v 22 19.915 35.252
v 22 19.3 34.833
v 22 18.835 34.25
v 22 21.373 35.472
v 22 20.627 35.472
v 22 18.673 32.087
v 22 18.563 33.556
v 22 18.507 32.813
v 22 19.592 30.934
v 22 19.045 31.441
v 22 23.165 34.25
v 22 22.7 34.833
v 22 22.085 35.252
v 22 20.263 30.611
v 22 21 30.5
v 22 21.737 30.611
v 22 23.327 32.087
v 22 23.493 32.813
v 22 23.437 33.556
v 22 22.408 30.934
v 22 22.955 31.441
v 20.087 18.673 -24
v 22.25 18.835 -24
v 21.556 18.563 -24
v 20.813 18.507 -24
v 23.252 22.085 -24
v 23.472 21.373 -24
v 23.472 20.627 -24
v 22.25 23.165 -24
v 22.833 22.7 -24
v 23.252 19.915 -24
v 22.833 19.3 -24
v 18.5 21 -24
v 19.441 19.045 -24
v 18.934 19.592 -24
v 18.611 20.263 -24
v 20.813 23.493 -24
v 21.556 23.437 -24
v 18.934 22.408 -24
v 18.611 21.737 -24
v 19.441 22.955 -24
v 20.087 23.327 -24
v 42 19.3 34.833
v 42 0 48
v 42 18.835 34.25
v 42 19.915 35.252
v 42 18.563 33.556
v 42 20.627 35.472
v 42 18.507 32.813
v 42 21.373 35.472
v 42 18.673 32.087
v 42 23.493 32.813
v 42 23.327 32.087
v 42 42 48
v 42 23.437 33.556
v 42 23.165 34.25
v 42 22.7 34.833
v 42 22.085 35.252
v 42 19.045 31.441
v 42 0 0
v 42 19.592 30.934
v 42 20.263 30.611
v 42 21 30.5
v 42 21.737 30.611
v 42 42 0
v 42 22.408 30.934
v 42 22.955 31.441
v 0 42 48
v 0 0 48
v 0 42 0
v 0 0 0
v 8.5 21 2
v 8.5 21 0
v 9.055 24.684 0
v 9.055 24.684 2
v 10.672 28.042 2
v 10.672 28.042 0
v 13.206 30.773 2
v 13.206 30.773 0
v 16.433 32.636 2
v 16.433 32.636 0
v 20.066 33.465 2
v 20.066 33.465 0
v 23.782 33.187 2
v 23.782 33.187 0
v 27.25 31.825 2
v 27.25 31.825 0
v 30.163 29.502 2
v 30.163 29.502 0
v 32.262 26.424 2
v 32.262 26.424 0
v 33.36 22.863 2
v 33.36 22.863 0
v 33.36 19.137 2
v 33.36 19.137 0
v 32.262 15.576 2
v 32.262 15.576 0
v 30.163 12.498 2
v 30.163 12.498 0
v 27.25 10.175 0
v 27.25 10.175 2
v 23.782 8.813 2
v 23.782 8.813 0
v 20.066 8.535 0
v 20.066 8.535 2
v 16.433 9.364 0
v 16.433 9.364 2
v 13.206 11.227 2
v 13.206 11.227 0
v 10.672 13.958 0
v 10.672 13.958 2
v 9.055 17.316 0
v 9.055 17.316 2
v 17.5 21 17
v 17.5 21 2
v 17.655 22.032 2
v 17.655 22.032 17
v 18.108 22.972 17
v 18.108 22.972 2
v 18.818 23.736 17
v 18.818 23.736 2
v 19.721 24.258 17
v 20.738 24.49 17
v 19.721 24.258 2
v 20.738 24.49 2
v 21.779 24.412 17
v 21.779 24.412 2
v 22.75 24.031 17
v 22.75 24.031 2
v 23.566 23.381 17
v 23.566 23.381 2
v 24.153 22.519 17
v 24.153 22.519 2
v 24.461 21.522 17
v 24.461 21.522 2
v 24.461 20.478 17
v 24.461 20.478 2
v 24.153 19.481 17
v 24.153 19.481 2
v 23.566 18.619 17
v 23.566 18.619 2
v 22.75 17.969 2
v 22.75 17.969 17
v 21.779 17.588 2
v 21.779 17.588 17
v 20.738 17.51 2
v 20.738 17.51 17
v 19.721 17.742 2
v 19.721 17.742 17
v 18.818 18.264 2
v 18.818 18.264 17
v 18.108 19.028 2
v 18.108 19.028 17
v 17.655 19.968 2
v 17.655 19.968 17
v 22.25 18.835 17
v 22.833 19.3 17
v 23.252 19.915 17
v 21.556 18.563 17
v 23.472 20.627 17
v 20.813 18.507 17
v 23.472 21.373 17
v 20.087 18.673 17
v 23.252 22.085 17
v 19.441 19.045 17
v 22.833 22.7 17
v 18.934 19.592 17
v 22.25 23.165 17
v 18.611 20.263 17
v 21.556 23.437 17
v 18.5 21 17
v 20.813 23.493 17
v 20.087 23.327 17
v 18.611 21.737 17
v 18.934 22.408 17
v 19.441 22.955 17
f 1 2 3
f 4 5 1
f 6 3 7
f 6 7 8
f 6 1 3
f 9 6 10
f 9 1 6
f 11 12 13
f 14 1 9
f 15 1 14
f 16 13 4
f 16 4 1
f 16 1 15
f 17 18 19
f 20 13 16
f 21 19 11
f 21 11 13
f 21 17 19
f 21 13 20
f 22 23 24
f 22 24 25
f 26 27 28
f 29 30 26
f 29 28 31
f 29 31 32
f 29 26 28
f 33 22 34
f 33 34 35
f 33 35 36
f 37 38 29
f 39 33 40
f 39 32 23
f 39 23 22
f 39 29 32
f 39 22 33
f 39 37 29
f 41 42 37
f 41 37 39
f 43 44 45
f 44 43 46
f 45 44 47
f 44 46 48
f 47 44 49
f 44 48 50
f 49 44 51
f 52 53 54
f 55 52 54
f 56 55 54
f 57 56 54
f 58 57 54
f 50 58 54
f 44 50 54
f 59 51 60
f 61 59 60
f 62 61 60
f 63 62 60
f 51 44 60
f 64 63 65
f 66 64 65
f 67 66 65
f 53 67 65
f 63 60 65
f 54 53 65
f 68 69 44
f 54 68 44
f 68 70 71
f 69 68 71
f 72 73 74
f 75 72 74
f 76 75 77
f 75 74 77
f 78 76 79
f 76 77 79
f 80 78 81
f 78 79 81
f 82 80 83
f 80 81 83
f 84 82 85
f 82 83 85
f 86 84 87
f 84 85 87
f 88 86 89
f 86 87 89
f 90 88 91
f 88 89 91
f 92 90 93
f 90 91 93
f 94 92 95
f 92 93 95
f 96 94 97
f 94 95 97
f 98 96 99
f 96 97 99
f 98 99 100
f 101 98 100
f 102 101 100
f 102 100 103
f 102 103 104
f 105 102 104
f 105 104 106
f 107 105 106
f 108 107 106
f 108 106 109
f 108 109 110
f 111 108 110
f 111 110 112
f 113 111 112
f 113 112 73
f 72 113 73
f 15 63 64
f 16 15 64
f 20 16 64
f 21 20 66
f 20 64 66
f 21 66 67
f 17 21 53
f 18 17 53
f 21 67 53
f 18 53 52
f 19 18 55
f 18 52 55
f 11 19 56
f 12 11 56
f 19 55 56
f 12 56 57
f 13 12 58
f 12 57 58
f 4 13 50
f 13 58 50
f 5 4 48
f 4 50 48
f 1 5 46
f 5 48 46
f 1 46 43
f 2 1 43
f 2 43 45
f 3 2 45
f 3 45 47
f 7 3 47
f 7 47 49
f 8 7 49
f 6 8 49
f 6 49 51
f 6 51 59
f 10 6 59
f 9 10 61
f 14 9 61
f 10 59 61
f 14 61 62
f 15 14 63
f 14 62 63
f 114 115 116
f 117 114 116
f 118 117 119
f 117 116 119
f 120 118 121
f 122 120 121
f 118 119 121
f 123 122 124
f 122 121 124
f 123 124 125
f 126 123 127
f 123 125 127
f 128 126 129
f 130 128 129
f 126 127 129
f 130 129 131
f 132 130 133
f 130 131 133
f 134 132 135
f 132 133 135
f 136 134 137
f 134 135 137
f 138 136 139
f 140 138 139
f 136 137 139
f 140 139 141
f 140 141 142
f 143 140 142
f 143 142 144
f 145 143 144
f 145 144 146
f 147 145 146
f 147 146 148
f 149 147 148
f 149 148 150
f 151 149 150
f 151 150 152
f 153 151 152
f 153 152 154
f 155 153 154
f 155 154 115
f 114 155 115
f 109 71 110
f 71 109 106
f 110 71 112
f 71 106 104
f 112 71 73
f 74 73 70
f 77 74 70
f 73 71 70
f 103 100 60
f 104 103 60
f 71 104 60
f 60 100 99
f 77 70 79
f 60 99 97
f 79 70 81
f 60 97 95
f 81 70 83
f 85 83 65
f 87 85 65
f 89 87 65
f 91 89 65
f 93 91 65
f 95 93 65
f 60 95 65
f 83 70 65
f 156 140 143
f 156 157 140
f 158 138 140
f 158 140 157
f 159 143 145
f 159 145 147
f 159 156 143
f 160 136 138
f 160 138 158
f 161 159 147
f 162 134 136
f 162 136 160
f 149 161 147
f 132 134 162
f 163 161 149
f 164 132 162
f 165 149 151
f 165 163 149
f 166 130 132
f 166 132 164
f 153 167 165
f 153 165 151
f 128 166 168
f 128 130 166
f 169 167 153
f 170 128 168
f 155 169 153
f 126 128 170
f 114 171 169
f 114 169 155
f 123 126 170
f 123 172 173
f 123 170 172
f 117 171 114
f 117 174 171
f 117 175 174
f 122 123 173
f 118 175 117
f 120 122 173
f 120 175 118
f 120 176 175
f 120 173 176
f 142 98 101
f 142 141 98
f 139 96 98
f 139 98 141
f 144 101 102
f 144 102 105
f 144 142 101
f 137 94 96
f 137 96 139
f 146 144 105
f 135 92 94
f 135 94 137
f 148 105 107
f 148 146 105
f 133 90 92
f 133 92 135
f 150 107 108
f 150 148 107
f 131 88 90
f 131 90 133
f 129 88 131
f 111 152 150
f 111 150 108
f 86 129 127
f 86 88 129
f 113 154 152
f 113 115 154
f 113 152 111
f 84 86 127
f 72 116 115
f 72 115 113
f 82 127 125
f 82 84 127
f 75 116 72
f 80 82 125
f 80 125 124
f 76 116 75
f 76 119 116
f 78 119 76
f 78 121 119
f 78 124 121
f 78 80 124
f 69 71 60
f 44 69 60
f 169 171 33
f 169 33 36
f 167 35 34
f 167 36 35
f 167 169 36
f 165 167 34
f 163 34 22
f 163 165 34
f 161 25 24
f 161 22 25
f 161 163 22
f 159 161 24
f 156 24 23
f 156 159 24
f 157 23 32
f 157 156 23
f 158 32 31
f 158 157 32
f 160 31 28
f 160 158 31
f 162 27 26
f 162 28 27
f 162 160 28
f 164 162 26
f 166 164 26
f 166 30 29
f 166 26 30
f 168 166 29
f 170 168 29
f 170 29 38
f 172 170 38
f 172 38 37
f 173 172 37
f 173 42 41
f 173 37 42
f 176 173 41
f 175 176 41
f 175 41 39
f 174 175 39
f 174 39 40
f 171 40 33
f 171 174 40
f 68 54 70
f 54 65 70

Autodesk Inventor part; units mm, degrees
ref_plane "YZ Plane" through (0, 0, 0) normal (1, 0, 0) x (0, 1, 0)
ref_plane "XZ Plane" through (0, 0, 0) normal (0, 1, 0) x (-1, 0, 0)
ref_plane "XY Plane" through (0, 0, 0) normal (0, 0, 1) x (1, 0, 0)
sketch "Esquisse1" plane through (0, 0, 0) normal (0, 0, 1) x (1, 0, 0)
  line L0 (0, 0) -> (42, 0)
  line L1 (42, 0) -> (42, 42)
  line L2 (42, 42) -> (0, 42)
  line L3 (0, 42) -> (0, 0)
  dimension "d0" = 42
  dimension "d1" = 42
extrude "Extrusion1" add sketch "Esquisse1" along normal blind 48
sketch "Esquisse2" plane through (0, 0, 0) normal (0, 0, -1) x (-1, 0, 0)
  line L0 (0, 42) -> (0, 0) projected
  line L1 (0, 0) -> (-42, 0) projected
  circle A0 centre (-21, 21) radius 12.5
  dimension "d4" = 21
  dimension "d5" = 21
  dimension "d6" = 25
extrude "Extrusion2" cut sketch "Esquisse2" against normal blind 2
sketch "Esquisse5" plane through (21, 21, 2) normal (0, 0, -1) x (-1, 0, 0)
  circle A0 centre (0, 0) radius 12.5 projected
  circle A1 centre (0, 0) radius 3.5
  point P0 (21, -21)
  dimension "d18" = 7
extrude "Extrusion5" cut sketch "Esquisse5" against normal blind 15 contours A1
sketch "Esquisse6" plane through (21, 21, 17) normal (0, 0, -1) x (-1, 0, 0)
  circle A0 centre (0, 0) radius 3.5 projected
  circle A1 centre (0, 0) radius 2.5
  point P0 (21, -21)
  dimension "d21" = 5
extrude "Extrusion6" add sketch "Esquisse6" along normal blind 41 contours A1
sketch "Esquisse7" plane through (42, 0, 0) normal (1, 0, 0) x (0, 0, -1)
  line L0 (0, 0) -> (-48, 0) projected
  line L1 (-48, 0) -> (-48, 42) projected
  circle A0 centre (-33, 21) radius 2.5
  line L2 (-15.5634, 24.7779) -> (-36.4192, 24.7779) construction
  line L3 (-36.4192, 24.7779) -> (-36.4192, 35.8396) construction
  line L4 (-36.4192, 35.8396) -> (-15.5634, 35.8396) construction
  line L5 (-15.5634, 35.8396) -> (-15.5634, 24.7779) construction
  dimension "d24" = 21
  dimension "d25" = 15
  dimension "d26" = 5
extrude "Extrusion7" cut sketch "Esquisse7" against normal blind 20
sketch "Esquisse8" plane through (42, 0, 0) normal (1, 0, 0) x (0, 0, -1)
  line L0 (-18.5513, 11.8106) -> (-48.2794, 11.8106) construction
  line L1 (-48.2794, 11.8106) -> (-48.2794, 27.9421) construction
  line L2 (-48.2794, 27.9421) -> (-18.5513, 27.9421) construction
  line L3 (-18.5513, 27.9421) -> (-18.5513, 11.8106) construction
  point P0 (0, 0)
properties part number "moteur 17HS19-2004S1"
